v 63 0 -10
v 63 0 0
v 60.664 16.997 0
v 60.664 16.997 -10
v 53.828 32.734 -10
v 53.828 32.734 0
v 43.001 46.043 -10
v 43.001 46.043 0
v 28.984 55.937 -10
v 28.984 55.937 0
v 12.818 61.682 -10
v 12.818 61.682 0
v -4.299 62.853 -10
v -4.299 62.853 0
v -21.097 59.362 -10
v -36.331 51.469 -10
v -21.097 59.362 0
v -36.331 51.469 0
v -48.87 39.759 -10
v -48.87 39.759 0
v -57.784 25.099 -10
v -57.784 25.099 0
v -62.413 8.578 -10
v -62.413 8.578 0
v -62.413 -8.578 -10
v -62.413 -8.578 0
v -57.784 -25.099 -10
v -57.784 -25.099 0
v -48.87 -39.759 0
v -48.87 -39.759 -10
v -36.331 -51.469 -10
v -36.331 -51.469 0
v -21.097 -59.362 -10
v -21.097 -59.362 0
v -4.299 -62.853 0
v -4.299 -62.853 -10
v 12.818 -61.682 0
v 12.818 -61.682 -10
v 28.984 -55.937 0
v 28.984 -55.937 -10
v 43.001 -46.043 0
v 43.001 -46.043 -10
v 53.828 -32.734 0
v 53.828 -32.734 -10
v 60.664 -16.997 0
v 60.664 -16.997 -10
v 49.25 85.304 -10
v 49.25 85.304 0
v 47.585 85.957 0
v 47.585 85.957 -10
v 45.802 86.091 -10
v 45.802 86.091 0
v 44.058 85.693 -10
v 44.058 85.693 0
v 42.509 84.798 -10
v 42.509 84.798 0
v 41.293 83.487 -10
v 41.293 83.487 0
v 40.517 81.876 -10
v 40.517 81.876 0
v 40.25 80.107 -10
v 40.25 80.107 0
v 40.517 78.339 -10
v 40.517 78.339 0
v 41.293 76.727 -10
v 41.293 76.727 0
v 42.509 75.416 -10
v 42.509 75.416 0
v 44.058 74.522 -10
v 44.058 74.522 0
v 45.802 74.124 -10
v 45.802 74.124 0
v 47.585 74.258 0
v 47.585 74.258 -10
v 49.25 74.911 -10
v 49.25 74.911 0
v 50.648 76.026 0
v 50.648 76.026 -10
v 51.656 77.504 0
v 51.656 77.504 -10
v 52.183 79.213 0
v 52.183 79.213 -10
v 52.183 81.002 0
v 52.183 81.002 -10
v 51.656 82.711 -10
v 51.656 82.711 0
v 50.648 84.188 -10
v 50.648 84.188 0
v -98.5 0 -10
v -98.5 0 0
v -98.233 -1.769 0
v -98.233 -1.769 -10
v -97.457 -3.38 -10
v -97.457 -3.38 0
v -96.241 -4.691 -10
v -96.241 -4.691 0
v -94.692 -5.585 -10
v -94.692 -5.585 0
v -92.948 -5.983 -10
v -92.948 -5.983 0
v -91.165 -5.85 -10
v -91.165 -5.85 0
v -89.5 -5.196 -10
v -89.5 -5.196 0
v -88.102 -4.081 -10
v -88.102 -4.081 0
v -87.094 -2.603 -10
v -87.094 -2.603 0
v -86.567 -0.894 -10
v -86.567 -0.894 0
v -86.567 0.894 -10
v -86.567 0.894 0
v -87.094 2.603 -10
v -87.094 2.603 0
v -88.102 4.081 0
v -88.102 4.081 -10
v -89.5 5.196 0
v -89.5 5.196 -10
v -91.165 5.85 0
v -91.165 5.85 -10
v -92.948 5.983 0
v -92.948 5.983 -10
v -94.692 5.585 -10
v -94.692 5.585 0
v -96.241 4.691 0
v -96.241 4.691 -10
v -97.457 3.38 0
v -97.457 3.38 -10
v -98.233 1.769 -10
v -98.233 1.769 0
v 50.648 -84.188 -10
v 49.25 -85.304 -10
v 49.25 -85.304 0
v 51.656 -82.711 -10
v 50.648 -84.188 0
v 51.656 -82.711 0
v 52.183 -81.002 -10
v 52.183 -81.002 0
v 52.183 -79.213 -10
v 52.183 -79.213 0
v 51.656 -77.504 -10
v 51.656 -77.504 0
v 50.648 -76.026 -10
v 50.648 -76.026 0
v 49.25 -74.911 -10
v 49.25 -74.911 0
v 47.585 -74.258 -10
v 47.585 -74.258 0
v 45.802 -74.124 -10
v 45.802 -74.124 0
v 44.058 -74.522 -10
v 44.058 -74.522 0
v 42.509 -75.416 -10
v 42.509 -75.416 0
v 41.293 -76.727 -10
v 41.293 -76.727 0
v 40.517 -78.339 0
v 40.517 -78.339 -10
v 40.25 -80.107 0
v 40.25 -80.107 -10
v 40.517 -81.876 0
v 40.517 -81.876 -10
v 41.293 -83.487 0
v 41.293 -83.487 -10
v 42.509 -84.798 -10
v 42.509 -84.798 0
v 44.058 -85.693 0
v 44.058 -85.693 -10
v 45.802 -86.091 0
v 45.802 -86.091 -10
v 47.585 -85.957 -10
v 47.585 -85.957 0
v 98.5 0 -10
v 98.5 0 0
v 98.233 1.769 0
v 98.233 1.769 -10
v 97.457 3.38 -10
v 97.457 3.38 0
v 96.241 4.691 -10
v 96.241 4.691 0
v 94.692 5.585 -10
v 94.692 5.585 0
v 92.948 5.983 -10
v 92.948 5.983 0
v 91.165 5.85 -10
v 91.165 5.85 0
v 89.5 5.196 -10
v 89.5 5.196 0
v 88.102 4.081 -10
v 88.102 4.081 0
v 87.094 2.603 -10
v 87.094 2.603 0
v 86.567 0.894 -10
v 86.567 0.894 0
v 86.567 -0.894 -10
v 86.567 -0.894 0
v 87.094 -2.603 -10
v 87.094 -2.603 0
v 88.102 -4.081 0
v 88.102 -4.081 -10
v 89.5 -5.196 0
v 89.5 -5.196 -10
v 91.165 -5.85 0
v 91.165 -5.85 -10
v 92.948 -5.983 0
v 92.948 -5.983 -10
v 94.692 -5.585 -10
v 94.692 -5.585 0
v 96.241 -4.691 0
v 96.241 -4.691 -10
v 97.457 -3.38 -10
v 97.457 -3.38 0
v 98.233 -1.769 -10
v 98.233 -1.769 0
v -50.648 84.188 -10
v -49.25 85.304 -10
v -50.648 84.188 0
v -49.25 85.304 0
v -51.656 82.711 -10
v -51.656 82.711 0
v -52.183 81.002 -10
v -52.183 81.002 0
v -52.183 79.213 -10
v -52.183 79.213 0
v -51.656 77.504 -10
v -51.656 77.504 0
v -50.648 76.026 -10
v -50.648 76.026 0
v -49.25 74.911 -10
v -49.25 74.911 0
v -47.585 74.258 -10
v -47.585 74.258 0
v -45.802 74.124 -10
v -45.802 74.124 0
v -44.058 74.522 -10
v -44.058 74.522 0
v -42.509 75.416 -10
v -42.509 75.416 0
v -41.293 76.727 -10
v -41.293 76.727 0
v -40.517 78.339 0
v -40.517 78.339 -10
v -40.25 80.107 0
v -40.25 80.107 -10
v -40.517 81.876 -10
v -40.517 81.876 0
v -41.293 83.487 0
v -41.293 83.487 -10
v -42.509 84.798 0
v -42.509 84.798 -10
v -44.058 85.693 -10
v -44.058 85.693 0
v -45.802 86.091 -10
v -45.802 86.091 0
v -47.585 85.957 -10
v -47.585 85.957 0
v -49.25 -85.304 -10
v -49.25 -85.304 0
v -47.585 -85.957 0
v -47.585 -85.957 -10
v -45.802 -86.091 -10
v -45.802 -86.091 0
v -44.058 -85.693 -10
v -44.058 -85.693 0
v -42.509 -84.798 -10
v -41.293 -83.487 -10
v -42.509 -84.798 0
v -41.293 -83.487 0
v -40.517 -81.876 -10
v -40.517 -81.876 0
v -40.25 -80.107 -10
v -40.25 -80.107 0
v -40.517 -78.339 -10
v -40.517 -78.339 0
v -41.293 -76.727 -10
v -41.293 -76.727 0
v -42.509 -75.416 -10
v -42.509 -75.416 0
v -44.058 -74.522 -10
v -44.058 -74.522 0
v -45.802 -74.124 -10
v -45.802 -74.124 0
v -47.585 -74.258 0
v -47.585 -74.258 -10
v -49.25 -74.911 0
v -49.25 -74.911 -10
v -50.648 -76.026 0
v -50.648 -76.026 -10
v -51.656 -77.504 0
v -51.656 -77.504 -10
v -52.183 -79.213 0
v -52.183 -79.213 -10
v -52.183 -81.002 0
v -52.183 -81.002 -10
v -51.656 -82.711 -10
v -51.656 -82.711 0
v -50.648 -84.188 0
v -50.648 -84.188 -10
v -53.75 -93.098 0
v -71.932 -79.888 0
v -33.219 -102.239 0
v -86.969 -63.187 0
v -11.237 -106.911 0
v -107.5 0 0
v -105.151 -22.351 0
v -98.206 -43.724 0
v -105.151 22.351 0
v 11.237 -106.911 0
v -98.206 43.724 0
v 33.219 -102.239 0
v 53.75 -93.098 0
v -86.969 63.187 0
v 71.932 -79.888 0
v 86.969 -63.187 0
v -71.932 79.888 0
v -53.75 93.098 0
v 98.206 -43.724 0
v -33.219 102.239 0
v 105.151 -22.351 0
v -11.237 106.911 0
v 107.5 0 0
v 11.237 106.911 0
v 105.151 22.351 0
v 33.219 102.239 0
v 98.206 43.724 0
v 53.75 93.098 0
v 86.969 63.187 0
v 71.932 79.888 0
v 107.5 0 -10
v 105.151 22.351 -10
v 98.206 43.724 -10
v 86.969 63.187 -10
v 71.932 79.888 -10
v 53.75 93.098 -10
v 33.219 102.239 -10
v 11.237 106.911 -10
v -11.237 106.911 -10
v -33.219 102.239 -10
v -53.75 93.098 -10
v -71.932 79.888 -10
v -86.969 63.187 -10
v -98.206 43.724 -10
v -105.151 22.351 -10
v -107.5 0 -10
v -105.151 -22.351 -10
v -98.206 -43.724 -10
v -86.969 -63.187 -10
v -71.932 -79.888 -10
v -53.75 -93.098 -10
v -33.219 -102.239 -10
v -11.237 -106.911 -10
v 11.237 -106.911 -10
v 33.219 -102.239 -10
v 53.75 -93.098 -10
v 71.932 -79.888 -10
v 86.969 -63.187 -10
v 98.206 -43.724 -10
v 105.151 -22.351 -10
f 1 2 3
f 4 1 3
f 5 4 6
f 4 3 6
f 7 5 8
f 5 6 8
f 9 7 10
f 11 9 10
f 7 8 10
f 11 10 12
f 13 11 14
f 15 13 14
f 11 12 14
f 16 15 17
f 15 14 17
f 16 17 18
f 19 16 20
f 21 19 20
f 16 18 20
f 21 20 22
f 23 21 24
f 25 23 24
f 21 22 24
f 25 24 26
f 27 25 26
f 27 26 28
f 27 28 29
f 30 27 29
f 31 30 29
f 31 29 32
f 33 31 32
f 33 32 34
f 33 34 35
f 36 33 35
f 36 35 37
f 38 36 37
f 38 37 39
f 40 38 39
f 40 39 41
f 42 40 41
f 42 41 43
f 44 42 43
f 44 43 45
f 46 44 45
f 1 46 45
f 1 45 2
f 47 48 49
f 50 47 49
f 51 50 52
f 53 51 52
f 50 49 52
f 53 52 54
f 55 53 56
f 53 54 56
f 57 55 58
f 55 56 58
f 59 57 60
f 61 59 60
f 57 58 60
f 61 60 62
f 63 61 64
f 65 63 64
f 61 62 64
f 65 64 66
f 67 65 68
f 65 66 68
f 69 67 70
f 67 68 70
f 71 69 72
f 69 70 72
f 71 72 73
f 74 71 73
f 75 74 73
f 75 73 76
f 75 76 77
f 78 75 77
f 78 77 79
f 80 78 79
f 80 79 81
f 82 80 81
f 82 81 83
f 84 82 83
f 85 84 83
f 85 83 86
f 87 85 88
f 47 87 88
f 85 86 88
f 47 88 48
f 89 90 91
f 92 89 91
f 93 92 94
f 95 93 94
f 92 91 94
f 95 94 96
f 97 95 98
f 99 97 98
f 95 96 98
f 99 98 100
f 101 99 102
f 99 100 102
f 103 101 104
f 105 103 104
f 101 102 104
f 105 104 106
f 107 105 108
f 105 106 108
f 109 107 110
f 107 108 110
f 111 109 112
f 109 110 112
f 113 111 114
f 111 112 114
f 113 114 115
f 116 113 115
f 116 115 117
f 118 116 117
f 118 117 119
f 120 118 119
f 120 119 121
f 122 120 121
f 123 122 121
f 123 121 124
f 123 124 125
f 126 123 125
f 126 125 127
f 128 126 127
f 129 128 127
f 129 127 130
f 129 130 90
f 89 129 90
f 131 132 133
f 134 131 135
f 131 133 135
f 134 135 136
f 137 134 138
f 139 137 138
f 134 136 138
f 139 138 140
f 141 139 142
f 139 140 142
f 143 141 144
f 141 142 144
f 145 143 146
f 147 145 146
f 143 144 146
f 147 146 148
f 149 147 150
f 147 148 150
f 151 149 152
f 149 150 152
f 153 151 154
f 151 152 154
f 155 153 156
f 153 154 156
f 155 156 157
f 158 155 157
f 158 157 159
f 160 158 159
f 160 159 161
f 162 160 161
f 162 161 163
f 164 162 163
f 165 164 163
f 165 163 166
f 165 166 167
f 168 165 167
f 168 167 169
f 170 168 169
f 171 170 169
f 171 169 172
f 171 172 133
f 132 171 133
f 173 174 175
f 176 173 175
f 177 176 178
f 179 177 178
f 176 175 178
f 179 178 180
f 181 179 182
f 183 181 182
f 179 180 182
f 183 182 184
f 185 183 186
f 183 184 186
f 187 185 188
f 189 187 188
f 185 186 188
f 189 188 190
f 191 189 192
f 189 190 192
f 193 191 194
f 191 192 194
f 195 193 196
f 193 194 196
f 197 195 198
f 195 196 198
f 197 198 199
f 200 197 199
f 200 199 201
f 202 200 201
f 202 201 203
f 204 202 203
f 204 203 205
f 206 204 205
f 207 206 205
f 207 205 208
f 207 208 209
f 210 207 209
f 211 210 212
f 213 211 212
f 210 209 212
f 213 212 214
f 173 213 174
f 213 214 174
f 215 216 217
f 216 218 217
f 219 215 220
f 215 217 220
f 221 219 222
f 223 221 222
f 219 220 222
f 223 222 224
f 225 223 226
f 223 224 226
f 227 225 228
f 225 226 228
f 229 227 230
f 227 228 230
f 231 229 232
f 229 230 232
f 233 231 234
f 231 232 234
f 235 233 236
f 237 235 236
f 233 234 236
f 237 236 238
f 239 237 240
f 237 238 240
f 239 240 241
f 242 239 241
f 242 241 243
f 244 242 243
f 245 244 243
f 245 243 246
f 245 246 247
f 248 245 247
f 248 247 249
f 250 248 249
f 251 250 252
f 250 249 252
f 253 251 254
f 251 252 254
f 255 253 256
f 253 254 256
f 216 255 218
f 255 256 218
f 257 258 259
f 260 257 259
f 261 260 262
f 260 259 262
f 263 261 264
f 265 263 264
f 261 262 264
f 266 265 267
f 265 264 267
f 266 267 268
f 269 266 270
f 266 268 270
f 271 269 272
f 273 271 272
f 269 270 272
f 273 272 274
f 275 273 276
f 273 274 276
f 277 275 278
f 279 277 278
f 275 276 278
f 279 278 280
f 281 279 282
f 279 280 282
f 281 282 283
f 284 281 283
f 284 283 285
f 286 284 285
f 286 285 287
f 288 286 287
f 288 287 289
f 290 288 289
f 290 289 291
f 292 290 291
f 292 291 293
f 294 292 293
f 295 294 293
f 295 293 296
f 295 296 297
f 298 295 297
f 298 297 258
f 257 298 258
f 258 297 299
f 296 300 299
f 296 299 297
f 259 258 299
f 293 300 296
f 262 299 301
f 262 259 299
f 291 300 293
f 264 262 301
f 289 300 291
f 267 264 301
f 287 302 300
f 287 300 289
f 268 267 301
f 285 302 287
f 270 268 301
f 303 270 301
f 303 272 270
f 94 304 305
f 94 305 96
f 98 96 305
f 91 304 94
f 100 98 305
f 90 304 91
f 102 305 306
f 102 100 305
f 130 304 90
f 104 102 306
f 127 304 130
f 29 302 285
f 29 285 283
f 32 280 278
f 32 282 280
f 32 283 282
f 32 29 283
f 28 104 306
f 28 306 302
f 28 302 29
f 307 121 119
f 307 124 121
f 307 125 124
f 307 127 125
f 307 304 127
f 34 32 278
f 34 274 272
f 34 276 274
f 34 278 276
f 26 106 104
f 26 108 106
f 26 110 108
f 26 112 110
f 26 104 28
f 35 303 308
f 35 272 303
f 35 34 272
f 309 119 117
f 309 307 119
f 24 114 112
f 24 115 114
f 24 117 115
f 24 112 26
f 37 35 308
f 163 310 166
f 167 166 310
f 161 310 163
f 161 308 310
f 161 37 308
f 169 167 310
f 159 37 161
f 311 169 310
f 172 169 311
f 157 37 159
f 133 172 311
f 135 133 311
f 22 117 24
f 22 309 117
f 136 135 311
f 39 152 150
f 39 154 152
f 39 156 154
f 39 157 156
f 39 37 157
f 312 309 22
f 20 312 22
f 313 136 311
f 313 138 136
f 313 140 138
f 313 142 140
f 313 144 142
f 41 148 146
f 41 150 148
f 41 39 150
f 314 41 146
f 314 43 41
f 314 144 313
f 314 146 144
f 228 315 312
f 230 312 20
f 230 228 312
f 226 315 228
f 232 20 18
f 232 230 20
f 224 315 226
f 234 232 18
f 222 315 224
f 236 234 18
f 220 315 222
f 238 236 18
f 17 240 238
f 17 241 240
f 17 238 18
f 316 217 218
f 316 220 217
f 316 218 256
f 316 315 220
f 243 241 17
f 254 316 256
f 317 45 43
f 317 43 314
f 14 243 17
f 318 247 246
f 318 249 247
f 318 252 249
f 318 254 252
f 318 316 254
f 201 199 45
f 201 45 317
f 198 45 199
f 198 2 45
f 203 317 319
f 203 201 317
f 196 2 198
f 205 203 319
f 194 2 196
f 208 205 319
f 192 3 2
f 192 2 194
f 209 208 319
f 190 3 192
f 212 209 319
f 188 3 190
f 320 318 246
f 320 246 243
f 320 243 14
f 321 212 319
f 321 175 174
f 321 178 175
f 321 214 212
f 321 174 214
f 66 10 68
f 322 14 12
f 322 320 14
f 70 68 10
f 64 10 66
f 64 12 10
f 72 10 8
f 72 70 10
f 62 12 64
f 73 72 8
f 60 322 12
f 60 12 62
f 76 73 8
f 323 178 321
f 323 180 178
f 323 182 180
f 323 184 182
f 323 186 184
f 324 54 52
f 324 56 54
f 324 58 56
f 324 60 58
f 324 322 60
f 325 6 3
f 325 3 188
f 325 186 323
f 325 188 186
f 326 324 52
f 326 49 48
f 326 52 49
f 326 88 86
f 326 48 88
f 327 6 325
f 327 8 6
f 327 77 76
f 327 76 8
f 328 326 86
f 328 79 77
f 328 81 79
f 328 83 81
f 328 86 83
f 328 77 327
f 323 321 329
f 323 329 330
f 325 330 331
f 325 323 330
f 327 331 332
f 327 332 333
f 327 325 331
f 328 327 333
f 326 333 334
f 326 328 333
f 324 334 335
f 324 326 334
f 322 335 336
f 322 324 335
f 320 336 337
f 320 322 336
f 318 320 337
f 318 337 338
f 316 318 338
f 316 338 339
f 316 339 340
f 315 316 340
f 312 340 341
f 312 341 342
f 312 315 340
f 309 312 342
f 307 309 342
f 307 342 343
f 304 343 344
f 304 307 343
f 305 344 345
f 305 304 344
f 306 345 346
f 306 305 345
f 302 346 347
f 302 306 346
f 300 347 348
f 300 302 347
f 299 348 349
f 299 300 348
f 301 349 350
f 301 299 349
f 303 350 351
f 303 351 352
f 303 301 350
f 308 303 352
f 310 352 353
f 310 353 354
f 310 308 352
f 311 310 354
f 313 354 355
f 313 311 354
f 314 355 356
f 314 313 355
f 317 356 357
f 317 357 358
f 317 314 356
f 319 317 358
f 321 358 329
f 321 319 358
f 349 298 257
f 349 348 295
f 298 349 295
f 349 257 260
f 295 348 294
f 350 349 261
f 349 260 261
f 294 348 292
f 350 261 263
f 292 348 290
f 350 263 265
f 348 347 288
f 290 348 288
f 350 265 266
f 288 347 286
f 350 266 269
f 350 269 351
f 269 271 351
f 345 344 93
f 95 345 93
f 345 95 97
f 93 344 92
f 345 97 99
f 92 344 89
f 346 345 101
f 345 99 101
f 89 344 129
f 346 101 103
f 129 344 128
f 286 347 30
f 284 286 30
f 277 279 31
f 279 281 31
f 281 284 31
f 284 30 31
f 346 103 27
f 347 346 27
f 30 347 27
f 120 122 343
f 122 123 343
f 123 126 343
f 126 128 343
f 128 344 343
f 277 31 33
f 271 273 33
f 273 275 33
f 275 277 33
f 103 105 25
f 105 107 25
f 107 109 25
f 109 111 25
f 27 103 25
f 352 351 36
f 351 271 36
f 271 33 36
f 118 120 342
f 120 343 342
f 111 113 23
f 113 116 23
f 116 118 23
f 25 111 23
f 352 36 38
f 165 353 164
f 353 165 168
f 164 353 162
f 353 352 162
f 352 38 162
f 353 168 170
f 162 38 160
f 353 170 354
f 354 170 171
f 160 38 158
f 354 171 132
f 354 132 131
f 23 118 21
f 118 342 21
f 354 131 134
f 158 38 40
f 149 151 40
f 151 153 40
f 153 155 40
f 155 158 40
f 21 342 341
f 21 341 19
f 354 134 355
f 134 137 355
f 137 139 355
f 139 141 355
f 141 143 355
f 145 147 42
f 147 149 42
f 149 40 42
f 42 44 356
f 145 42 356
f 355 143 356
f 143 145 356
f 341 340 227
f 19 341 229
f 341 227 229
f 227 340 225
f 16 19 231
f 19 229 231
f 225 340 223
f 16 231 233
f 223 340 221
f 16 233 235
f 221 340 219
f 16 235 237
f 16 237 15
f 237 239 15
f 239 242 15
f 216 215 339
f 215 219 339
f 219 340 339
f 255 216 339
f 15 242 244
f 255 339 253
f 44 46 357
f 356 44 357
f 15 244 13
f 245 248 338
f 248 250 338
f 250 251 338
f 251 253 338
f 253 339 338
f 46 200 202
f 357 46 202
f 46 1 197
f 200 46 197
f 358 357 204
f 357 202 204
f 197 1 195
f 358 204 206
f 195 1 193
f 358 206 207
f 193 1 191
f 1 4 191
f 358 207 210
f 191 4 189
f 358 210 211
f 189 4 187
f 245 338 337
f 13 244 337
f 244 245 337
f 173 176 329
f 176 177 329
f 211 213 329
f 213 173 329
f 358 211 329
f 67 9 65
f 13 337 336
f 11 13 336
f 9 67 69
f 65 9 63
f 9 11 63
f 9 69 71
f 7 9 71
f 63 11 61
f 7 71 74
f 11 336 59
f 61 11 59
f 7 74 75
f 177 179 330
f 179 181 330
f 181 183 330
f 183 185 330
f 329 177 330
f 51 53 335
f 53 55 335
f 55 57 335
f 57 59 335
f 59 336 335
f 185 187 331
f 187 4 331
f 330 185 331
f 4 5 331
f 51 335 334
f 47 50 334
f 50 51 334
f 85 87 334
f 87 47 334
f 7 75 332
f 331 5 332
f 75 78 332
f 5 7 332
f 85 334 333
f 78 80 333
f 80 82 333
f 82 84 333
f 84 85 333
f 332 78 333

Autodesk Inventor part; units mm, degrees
ref_plane "YZ Plane" through (0, 0, 0) normal (1, 0, 0) x (0, 1, 0)
ref_plane "XZ Plane" through (0, 0, 0) normal (0, 1, 0) x (-1, 0, 0)
ref_plane "XY Plane" through (0, 0, 0) normal (0, 0, 1) x (1, 0, 0)
sketch "Sketch1" plane through (0, 0, 0) normal (0, 0, 1) x (1, 0, 0)
  circle A0 centre (0, 0) radius 63
  circle A1 centre (0, 0) radius 107.5
  dimension "d0" = 126
  dimension "d1" = 215
extrude "Extrusion1" add sketch "Sketch1" against normal blind 10
sketch "Sketch3" plane through (0, 0, 0) normal (0, 0, 1) x (1, 0, 0)
  circle A0 centre (92.5, 0) radius 6
  circle A1 centre (0, 0) radius 92.5 construction
  dimension "d4" = 185
  dimension "d5" = 12
extrude "Cut1" cut sketch "Sketch3" against normal blind 10
pattern_circular "Circular Pattern1" count 6 over 360 about axis through (0, 0, 0) along (0, 0, -1) of "Cut1"
equation "\"d4\" = back_steel_circle_диам_центров"
equation "\"d7\" = Thickness"
equation "\"BendReliefDepth\" = 0.5 * Thickness"
equation "\"back_steel_circle_диам_центров\" = 185"
equation "\"Thickness\" = 10"
properties part number "NVPH-332 tube flange 1"
